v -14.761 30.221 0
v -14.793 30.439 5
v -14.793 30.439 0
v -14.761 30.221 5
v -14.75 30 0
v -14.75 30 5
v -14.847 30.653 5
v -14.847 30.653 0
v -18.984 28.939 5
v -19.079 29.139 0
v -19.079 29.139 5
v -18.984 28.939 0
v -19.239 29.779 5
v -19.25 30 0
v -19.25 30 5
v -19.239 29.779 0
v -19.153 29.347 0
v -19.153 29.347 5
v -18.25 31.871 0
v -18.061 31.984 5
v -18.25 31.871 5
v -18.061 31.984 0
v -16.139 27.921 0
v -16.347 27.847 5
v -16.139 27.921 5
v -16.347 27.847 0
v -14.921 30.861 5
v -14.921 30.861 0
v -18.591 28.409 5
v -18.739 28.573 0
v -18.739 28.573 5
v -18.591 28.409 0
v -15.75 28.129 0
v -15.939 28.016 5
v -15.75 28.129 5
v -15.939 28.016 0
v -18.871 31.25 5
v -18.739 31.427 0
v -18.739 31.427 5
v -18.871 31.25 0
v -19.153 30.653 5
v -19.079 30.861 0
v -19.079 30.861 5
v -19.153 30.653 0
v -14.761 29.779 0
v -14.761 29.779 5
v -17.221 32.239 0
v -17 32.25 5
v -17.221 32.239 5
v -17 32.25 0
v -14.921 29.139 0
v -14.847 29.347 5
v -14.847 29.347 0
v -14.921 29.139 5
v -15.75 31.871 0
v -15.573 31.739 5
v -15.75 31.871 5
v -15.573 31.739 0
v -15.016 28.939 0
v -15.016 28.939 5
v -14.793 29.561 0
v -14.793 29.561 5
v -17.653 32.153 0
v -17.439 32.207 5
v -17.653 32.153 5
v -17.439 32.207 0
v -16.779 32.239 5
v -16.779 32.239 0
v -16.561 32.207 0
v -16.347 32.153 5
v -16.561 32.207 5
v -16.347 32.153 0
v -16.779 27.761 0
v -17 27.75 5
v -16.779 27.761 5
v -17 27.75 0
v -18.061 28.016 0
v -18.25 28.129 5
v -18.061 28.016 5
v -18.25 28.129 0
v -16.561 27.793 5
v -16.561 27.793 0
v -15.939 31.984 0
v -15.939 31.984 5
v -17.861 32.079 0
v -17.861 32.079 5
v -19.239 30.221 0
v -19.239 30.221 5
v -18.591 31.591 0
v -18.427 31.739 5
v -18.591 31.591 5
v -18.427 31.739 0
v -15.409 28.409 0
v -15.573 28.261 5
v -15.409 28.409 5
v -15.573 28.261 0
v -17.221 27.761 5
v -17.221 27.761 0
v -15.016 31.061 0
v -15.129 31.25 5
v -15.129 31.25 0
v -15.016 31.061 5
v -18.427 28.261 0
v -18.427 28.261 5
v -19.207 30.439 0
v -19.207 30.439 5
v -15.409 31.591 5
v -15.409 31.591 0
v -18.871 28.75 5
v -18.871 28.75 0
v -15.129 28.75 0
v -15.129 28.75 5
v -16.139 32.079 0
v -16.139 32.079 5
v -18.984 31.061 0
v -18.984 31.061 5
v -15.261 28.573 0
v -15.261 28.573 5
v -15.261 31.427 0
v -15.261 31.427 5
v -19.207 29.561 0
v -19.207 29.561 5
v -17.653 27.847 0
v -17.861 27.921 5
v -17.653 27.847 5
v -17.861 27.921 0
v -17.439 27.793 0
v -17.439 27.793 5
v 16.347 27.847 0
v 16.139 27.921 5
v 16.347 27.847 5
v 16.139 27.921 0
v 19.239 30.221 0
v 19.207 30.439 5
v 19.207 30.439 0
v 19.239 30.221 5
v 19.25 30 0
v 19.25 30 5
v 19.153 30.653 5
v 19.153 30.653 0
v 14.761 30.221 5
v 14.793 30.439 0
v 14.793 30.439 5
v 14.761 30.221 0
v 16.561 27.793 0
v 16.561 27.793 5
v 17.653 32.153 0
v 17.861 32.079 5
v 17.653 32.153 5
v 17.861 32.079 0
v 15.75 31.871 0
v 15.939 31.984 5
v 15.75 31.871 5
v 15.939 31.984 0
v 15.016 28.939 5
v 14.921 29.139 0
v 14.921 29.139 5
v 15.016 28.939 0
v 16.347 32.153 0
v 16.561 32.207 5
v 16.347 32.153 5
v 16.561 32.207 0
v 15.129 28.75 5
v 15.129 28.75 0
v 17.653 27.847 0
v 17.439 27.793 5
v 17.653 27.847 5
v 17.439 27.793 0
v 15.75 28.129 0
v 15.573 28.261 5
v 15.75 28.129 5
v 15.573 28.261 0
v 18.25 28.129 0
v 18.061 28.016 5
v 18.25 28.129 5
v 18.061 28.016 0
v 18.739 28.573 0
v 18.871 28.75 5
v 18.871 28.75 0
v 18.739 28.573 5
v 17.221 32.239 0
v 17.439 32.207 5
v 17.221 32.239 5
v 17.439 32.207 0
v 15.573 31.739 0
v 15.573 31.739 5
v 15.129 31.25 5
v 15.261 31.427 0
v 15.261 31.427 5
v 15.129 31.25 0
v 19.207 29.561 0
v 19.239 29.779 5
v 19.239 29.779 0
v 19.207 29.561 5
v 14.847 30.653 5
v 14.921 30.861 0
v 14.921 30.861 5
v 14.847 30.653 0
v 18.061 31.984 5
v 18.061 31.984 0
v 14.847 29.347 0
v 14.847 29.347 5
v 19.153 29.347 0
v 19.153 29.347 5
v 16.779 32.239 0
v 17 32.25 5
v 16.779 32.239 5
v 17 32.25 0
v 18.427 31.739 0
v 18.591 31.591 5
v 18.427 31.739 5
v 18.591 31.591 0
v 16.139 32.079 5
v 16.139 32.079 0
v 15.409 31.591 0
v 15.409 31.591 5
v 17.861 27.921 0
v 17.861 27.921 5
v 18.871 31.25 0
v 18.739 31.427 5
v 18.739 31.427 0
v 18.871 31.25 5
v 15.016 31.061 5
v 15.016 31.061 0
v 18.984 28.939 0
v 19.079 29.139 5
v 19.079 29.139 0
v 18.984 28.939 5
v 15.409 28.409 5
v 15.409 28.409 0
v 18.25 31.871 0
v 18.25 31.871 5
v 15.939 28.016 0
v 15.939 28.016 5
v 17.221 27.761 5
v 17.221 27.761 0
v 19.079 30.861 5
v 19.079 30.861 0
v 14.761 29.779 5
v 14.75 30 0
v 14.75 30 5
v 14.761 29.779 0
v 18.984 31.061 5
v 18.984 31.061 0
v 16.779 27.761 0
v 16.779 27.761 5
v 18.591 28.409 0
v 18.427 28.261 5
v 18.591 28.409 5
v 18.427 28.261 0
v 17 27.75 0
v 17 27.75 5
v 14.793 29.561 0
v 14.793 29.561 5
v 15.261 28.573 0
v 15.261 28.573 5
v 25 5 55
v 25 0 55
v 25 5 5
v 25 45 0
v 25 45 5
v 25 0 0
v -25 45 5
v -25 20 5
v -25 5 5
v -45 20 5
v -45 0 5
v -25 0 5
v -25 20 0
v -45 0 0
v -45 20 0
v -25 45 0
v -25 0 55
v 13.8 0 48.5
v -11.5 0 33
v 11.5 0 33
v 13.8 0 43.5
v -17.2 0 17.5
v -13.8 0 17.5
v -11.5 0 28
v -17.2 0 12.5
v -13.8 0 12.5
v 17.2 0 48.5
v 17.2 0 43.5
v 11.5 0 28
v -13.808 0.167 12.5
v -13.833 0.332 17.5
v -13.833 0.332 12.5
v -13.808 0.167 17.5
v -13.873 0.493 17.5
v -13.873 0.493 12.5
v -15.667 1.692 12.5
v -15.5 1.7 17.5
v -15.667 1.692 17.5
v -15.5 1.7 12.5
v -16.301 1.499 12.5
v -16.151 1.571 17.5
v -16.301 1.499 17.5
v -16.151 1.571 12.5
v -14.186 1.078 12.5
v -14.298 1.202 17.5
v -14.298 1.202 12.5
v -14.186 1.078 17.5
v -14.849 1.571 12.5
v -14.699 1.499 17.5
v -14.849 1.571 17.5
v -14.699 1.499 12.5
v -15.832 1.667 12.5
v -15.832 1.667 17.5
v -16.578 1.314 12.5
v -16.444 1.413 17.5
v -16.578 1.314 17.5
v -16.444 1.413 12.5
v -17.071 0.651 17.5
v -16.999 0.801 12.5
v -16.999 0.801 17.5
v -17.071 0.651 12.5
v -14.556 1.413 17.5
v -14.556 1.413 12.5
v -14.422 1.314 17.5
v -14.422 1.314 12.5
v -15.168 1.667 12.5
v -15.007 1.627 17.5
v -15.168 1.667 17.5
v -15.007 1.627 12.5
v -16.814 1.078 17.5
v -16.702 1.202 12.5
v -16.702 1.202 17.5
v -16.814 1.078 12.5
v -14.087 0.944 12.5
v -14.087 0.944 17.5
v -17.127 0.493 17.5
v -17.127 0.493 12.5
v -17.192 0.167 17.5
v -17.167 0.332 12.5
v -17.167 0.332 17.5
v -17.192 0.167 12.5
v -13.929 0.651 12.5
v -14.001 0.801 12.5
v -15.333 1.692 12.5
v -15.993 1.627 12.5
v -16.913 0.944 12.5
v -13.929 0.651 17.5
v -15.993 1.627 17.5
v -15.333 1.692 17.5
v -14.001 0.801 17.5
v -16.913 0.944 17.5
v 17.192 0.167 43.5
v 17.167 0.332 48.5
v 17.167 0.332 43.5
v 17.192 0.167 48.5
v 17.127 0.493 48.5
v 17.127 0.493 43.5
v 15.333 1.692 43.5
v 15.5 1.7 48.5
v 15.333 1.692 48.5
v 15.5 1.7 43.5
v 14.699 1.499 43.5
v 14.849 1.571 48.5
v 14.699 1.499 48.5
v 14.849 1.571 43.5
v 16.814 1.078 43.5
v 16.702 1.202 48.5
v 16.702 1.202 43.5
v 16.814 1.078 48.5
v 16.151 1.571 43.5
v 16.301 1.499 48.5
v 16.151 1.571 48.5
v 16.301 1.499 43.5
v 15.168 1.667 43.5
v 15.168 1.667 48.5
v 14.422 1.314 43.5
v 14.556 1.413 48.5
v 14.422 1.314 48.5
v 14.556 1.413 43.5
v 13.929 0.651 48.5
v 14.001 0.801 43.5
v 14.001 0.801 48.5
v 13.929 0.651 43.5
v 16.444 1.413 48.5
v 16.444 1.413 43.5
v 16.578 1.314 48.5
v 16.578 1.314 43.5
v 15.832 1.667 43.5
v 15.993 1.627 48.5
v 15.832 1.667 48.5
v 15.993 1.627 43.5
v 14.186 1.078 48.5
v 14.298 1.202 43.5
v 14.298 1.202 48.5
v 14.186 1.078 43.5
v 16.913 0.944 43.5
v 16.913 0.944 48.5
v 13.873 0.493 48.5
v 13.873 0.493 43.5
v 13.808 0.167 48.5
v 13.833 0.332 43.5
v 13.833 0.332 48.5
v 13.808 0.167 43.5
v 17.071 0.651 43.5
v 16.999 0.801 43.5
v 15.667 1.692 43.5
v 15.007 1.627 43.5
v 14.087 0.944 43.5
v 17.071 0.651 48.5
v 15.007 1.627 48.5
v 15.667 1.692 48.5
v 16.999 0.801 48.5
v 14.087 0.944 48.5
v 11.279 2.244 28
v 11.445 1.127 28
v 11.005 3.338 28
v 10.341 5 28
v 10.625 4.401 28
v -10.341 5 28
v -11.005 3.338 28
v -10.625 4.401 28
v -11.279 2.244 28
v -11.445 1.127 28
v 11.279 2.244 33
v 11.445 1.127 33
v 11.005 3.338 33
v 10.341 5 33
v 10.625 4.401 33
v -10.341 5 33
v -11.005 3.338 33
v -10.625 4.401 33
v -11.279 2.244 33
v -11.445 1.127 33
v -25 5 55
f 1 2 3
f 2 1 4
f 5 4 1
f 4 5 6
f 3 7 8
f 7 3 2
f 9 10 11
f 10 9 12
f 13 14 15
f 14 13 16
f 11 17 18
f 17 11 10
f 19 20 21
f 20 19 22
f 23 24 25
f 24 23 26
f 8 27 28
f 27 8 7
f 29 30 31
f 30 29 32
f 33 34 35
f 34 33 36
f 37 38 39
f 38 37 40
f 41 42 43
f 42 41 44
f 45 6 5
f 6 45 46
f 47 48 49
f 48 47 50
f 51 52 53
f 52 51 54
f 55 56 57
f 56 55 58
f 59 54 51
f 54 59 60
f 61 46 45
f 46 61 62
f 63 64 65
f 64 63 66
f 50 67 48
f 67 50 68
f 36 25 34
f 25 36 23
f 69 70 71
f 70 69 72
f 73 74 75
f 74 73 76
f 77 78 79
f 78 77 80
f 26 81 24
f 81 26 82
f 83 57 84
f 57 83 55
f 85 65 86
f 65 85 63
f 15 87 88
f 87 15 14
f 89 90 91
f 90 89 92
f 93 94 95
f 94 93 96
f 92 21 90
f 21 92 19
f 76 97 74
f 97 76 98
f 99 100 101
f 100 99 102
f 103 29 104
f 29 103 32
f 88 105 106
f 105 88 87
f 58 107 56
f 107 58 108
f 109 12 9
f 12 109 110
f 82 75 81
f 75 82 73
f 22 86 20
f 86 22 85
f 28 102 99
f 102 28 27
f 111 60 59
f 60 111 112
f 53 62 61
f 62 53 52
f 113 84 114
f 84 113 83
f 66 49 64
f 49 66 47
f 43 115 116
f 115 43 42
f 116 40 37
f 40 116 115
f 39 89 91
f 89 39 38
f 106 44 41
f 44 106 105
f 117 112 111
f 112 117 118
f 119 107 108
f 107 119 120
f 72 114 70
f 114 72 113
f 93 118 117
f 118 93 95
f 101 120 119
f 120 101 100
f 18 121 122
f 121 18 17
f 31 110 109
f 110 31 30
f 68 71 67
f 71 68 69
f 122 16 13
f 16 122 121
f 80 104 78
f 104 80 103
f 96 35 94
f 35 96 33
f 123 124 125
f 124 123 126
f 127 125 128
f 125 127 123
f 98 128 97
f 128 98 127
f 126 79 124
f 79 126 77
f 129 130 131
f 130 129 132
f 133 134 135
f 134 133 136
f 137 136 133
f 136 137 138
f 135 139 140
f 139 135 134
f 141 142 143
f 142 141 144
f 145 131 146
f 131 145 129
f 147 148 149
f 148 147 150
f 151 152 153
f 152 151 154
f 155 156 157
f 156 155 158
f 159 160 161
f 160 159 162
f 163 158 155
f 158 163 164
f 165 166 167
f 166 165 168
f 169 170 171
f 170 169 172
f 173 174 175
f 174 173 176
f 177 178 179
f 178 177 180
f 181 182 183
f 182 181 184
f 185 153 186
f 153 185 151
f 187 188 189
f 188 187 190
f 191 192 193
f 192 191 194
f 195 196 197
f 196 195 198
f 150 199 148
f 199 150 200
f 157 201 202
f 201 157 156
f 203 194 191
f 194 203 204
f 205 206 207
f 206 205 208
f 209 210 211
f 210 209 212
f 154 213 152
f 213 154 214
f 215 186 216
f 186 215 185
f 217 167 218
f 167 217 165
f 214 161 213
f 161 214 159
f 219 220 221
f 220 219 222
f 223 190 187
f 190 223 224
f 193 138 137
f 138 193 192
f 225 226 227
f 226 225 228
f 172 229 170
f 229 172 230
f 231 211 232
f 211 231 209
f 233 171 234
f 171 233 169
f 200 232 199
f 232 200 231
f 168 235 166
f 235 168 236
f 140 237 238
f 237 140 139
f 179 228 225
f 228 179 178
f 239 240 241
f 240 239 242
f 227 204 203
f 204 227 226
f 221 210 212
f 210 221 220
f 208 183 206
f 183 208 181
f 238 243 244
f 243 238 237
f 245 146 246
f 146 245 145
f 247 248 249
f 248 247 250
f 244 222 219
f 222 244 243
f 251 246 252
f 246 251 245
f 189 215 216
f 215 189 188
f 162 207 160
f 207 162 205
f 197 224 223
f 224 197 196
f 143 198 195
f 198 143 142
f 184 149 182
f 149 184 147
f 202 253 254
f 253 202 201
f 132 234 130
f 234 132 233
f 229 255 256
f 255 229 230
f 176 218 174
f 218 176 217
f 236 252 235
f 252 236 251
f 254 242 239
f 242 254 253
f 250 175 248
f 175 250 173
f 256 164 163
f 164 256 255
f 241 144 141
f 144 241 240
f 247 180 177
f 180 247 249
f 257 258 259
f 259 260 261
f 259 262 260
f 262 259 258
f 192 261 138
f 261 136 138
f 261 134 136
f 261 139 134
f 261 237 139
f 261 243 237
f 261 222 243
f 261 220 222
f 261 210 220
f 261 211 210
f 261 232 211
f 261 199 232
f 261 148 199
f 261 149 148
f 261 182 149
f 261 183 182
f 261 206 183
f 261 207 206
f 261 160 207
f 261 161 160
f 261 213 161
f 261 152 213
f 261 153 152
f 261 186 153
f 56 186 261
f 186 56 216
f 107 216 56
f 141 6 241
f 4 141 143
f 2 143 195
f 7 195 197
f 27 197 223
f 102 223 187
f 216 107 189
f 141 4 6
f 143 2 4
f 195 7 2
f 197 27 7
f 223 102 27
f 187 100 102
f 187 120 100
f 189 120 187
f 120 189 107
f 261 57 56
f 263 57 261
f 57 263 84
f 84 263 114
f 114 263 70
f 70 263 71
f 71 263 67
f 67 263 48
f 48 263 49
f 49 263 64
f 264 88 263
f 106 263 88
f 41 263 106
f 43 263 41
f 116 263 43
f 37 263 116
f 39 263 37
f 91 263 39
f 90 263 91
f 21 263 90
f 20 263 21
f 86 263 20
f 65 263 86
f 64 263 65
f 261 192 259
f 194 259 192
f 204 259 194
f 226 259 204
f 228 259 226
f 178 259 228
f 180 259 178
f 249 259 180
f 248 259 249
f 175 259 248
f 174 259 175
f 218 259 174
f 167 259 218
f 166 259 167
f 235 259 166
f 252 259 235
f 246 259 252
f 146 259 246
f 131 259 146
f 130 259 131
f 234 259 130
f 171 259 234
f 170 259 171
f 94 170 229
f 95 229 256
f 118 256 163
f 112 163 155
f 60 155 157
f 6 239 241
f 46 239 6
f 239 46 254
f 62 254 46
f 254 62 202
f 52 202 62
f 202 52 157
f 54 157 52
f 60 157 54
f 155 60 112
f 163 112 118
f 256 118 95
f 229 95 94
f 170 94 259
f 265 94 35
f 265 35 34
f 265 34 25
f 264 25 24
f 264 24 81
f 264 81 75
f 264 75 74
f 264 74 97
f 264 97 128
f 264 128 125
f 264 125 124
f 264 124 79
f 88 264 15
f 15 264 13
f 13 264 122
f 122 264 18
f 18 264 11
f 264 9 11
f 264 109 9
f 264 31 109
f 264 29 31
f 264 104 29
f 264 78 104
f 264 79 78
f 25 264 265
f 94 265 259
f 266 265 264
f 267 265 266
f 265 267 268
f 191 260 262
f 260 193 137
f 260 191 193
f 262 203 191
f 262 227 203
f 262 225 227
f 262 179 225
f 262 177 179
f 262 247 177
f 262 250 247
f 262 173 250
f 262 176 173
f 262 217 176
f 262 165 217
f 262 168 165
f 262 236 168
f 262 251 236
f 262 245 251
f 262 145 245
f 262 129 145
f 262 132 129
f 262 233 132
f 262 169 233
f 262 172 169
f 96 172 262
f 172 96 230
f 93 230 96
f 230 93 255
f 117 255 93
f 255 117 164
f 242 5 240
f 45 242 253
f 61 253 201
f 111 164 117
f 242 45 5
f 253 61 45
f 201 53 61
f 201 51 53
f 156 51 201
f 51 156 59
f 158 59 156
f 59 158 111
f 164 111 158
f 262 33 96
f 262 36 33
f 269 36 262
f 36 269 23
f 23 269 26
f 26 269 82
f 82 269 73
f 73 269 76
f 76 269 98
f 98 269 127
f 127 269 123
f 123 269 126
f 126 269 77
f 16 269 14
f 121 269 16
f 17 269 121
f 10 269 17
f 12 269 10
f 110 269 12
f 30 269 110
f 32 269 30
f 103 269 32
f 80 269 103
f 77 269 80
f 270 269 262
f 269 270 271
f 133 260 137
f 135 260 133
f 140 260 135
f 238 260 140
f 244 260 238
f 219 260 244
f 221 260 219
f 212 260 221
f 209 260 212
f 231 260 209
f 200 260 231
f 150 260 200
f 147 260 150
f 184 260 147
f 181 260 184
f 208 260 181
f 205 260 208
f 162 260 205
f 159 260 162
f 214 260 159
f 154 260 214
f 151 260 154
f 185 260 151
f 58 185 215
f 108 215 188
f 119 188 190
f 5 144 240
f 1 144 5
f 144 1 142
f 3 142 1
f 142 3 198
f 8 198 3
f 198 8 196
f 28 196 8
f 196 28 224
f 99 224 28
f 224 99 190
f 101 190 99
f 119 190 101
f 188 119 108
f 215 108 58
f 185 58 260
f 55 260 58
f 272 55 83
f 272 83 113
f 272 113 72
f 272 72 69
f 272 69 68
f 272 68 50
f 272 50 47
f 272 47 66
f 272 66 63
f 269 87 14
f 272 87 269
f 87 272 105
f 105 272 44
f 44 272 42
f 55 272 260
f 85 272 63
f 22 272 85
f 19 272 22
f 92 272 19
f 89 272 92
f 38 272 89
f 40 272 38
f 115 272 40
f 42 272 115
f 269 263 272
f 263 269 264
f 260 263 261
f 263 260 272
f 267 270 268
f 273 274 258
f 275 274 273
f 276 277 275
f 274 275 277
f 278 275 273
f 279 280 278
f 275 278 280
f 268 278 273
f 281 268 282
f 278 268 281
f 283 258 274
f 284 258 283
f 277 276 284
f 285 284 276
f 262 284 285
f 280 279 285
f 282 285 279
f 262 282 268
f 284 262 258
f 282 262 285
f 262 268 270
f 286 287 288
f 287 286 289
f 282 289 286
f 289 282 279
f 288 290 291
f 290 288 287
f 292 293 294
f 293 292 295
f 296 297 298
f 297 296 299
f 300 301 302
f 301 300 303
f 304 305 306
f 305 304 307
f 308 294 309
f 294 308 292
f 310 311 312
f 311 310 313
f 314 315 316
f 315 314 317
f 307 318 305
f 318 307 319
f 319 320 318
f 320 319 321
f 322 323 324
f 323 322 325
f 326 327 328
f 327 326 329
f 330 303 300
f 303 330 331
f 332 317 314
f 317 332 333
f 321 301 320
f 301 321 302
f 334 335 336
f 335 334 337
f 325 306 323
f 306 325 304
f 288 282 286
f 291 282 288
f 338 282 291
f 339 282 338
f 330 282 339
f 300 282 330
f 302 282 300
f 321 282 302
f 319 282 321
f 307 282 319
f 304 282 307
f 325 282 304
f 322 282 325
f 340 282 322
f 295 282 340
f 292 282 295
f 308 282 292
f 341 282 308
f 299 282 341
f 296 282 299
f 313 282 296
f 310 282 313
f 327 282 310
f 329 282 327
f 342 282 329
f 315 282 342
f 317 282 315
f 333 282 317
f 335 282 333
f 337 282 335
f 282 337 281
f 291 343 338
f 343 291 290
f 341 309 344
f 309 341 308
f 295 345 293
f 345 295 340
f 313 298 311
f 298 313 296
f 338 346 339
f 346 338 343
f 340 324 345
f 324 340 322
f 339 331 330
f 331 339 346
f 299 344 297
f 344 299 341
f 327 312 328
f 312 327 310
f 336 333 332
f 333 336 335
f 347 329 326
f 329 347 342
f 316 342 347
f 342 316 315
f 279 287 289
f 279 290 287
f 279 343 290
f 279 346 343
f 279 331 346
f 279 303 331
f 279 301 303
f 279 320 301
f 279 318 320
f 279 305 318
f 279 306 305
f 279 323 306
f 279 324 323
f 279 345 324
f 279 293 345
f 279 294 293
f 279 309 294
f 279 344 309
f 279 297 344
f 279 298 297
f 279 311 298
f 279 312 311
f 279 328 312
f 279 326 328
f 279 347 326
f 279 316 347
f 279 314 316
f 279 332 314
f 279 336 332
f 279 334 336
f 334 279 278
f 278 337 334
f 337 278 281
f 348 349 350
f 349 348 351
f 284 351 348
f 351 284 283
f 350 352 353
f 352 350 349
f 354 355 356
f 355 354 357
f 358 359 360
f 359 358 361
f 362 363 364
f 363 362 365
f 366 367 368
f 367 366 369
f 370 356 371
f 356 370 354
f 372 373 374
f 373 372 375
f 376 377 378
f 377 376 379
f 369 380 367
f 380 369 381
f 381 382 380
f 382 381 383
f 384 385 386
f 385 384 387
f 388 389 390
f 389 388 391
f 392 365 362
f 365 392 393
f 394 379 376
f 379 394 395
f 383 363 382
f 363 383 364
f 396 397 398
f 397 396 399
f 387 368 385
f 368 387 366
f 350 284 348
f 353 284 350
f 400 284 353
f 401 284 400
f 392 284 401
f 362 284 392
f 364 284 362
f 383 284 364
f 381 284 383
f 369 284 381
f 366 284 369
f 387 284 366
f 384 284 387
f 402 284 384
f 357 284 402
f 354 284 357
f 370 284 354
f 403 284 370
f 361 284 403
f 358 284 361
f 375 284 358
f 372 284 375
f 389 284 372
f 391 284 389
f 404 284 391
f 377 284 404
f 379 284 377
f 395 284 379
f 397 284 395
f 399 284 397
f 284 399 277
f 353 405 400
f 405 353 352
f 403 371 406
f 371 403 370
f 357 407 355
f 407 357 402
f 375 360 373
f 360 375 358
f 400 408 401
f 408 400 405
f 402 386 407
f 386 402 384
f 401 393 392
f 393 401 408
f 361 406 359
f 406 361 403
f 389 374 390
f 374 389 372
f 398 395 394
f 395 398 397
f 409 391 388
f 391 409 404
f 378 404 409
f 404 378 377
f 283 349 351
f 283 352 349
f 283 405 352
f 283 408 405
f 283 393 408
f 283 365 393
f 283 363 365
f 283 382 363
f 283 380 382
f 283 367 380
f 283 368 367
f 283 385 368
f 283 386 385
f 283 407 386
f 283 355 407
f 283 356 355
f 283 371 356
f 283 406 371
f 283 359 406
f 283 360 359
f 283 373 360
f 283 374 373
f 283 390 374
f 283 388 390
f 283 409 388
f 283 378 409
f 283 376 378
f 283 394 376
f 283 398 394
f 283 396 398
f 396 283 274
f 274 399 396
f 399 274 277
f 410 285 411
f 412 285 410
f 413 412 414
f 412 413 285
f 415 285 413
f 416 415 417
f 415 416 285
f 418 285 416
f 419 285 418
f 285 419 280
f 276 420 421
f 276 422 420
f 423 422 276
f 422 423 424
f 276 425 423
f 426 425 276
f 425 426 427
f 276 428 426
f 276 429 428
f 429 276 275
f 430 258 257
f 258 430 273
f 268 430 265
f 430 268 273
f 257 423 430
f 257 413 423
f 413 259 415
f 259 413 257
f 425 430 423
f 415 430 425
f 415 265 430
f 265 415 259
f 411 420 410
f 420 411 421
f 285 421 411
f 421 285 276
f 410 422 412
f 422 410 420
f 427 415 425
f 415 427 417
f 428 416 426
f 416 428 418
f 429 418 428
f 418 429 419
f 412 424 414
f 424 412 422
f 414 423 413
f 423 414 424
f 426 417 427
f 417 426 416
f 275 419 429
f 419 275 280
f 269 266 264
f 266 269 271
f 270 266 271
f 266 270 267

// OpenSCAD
// L-shaped mounting bracket for NEMA 17 stepper motor.
// Base plate: 50x45x5 mm. Vertical plate: 50x5x50 mm.
// Includes M4 holes in base, motor boss hole, M3 screw holes, and gussets.

// Base dimensions
base_x = 50;
base_y = 45;
base_z = 5;

// Vertical plate dimensions
vert_x = 50;
vert_y = 5;
vert_z = 50;

// Hole positions and sizes
m4_x1 = -17;
m4_y1 = 30;
m4_x2 = 17;
m4_y2 = 30;
m4_d  = 4.5;

boss_x = 0;
boss_z = 28;
boss_d = 23;

m3_count = 4;
m3_d    = 3.4;
m3_pat  = 31; // square pattern size

// Gusset dimensions
gusset_x_start = -25;
gusset_x_end   = -20;
gusset_x2_start = 20;
gusset_x2_end   = 25;
gusset_y_leg = 20;
gusset_z_leg = 20;
gusset_t     = 5;

$fn = 64;

// Base plate
difference() {
    translate([-base_x / 2, 0, 0]) cube([base_x, base_y, base_z]);
    
    // M4 holes (extend slightly past base thickness)
    for (i = [0 : 1]) {
        translate([
            i == 0 ? m4_x1 : m4_x2,
            m4_y1,
            -0.1
        ]) cylinder(h = base_z + 0.2, d = m4_d);
    }
}

// Vertical plate
difference() {
    // Main body of vertical plate
    translate([-vert_x / 2, 0, base_z]) cube([vert_x, vert_y, vert_z]);
    
    // Boss hole (along Y axis)
    translate([boss_x, 0, boss_z]) cylinder(h = vert_y, d = boss_d);
    
    // M3 screw holes (square pattern centred on boss)
    // Pattern: 31mm square, centred at x=0, z=28.
    // Points: (-15.5, 0, 28), (15.5, 0, 28), (0, 0, 12.5), (0, 0, 43.5)
    // Actually, a square pattern usually means corners of a square.
    // Let's assume corners of a 31x31 square centred at (0, 28).
    // x = +/- 15.5, z = 28 +/- 15.5.
    // Points: (-15.5, 0, 12.5), (-15.5, 0, 43.5), (15.5, 0, 12.5), (15.5, 0, 43.5)
    
    for (i = [0 : 3]) {
        translate([
            i == 0 ? -15.5 : (i == 1 ? 15.5 : 0),
            0,
            i == 0 ? 12.5 : (i == 1 ? 43.5 : 28)
        ]) cylinder(h = vert_y, d = m3_d);
    }
}

// Gussets (Right triangles in YZ plane, extruded along X)
// Left Gusset
translate([gusset_x_start, 0, 0]) {
    rotate([0, 0, 90]) // Face YZ plane
    linear_extrude(height = gusset_x_end - gusset_x_start)
    polygon([
        [0, 0],       // (y=0, z=0) - bottom left
        [gusset_y_leg, 0], // (y=20, z=0) - bottom right
        [gusset_y_leg, gusset_z_leg], // (y=20, z=20) - top right
        [0, gusset_z_leg]  // (y=0, z=20) - top left
    ]);
}

// Right Gusset
translate([gusset_x2_start, 0, 0]) {
    rotate([0, 0, 90]) // Face YZ plane
    linear_extrude(height = gusset_x2_end - gusset_x2_start)
    polygon([
        [0, 0],       // (y=0, z=0)
        [gusset_y_leg, 0], // (y=20, z=0)
        [gusset_y_leg, gusset_z_leg], // (y=20, z=20)
        [0, gusset_z_leg]  // (y=0, z=20)
    ]);
}
